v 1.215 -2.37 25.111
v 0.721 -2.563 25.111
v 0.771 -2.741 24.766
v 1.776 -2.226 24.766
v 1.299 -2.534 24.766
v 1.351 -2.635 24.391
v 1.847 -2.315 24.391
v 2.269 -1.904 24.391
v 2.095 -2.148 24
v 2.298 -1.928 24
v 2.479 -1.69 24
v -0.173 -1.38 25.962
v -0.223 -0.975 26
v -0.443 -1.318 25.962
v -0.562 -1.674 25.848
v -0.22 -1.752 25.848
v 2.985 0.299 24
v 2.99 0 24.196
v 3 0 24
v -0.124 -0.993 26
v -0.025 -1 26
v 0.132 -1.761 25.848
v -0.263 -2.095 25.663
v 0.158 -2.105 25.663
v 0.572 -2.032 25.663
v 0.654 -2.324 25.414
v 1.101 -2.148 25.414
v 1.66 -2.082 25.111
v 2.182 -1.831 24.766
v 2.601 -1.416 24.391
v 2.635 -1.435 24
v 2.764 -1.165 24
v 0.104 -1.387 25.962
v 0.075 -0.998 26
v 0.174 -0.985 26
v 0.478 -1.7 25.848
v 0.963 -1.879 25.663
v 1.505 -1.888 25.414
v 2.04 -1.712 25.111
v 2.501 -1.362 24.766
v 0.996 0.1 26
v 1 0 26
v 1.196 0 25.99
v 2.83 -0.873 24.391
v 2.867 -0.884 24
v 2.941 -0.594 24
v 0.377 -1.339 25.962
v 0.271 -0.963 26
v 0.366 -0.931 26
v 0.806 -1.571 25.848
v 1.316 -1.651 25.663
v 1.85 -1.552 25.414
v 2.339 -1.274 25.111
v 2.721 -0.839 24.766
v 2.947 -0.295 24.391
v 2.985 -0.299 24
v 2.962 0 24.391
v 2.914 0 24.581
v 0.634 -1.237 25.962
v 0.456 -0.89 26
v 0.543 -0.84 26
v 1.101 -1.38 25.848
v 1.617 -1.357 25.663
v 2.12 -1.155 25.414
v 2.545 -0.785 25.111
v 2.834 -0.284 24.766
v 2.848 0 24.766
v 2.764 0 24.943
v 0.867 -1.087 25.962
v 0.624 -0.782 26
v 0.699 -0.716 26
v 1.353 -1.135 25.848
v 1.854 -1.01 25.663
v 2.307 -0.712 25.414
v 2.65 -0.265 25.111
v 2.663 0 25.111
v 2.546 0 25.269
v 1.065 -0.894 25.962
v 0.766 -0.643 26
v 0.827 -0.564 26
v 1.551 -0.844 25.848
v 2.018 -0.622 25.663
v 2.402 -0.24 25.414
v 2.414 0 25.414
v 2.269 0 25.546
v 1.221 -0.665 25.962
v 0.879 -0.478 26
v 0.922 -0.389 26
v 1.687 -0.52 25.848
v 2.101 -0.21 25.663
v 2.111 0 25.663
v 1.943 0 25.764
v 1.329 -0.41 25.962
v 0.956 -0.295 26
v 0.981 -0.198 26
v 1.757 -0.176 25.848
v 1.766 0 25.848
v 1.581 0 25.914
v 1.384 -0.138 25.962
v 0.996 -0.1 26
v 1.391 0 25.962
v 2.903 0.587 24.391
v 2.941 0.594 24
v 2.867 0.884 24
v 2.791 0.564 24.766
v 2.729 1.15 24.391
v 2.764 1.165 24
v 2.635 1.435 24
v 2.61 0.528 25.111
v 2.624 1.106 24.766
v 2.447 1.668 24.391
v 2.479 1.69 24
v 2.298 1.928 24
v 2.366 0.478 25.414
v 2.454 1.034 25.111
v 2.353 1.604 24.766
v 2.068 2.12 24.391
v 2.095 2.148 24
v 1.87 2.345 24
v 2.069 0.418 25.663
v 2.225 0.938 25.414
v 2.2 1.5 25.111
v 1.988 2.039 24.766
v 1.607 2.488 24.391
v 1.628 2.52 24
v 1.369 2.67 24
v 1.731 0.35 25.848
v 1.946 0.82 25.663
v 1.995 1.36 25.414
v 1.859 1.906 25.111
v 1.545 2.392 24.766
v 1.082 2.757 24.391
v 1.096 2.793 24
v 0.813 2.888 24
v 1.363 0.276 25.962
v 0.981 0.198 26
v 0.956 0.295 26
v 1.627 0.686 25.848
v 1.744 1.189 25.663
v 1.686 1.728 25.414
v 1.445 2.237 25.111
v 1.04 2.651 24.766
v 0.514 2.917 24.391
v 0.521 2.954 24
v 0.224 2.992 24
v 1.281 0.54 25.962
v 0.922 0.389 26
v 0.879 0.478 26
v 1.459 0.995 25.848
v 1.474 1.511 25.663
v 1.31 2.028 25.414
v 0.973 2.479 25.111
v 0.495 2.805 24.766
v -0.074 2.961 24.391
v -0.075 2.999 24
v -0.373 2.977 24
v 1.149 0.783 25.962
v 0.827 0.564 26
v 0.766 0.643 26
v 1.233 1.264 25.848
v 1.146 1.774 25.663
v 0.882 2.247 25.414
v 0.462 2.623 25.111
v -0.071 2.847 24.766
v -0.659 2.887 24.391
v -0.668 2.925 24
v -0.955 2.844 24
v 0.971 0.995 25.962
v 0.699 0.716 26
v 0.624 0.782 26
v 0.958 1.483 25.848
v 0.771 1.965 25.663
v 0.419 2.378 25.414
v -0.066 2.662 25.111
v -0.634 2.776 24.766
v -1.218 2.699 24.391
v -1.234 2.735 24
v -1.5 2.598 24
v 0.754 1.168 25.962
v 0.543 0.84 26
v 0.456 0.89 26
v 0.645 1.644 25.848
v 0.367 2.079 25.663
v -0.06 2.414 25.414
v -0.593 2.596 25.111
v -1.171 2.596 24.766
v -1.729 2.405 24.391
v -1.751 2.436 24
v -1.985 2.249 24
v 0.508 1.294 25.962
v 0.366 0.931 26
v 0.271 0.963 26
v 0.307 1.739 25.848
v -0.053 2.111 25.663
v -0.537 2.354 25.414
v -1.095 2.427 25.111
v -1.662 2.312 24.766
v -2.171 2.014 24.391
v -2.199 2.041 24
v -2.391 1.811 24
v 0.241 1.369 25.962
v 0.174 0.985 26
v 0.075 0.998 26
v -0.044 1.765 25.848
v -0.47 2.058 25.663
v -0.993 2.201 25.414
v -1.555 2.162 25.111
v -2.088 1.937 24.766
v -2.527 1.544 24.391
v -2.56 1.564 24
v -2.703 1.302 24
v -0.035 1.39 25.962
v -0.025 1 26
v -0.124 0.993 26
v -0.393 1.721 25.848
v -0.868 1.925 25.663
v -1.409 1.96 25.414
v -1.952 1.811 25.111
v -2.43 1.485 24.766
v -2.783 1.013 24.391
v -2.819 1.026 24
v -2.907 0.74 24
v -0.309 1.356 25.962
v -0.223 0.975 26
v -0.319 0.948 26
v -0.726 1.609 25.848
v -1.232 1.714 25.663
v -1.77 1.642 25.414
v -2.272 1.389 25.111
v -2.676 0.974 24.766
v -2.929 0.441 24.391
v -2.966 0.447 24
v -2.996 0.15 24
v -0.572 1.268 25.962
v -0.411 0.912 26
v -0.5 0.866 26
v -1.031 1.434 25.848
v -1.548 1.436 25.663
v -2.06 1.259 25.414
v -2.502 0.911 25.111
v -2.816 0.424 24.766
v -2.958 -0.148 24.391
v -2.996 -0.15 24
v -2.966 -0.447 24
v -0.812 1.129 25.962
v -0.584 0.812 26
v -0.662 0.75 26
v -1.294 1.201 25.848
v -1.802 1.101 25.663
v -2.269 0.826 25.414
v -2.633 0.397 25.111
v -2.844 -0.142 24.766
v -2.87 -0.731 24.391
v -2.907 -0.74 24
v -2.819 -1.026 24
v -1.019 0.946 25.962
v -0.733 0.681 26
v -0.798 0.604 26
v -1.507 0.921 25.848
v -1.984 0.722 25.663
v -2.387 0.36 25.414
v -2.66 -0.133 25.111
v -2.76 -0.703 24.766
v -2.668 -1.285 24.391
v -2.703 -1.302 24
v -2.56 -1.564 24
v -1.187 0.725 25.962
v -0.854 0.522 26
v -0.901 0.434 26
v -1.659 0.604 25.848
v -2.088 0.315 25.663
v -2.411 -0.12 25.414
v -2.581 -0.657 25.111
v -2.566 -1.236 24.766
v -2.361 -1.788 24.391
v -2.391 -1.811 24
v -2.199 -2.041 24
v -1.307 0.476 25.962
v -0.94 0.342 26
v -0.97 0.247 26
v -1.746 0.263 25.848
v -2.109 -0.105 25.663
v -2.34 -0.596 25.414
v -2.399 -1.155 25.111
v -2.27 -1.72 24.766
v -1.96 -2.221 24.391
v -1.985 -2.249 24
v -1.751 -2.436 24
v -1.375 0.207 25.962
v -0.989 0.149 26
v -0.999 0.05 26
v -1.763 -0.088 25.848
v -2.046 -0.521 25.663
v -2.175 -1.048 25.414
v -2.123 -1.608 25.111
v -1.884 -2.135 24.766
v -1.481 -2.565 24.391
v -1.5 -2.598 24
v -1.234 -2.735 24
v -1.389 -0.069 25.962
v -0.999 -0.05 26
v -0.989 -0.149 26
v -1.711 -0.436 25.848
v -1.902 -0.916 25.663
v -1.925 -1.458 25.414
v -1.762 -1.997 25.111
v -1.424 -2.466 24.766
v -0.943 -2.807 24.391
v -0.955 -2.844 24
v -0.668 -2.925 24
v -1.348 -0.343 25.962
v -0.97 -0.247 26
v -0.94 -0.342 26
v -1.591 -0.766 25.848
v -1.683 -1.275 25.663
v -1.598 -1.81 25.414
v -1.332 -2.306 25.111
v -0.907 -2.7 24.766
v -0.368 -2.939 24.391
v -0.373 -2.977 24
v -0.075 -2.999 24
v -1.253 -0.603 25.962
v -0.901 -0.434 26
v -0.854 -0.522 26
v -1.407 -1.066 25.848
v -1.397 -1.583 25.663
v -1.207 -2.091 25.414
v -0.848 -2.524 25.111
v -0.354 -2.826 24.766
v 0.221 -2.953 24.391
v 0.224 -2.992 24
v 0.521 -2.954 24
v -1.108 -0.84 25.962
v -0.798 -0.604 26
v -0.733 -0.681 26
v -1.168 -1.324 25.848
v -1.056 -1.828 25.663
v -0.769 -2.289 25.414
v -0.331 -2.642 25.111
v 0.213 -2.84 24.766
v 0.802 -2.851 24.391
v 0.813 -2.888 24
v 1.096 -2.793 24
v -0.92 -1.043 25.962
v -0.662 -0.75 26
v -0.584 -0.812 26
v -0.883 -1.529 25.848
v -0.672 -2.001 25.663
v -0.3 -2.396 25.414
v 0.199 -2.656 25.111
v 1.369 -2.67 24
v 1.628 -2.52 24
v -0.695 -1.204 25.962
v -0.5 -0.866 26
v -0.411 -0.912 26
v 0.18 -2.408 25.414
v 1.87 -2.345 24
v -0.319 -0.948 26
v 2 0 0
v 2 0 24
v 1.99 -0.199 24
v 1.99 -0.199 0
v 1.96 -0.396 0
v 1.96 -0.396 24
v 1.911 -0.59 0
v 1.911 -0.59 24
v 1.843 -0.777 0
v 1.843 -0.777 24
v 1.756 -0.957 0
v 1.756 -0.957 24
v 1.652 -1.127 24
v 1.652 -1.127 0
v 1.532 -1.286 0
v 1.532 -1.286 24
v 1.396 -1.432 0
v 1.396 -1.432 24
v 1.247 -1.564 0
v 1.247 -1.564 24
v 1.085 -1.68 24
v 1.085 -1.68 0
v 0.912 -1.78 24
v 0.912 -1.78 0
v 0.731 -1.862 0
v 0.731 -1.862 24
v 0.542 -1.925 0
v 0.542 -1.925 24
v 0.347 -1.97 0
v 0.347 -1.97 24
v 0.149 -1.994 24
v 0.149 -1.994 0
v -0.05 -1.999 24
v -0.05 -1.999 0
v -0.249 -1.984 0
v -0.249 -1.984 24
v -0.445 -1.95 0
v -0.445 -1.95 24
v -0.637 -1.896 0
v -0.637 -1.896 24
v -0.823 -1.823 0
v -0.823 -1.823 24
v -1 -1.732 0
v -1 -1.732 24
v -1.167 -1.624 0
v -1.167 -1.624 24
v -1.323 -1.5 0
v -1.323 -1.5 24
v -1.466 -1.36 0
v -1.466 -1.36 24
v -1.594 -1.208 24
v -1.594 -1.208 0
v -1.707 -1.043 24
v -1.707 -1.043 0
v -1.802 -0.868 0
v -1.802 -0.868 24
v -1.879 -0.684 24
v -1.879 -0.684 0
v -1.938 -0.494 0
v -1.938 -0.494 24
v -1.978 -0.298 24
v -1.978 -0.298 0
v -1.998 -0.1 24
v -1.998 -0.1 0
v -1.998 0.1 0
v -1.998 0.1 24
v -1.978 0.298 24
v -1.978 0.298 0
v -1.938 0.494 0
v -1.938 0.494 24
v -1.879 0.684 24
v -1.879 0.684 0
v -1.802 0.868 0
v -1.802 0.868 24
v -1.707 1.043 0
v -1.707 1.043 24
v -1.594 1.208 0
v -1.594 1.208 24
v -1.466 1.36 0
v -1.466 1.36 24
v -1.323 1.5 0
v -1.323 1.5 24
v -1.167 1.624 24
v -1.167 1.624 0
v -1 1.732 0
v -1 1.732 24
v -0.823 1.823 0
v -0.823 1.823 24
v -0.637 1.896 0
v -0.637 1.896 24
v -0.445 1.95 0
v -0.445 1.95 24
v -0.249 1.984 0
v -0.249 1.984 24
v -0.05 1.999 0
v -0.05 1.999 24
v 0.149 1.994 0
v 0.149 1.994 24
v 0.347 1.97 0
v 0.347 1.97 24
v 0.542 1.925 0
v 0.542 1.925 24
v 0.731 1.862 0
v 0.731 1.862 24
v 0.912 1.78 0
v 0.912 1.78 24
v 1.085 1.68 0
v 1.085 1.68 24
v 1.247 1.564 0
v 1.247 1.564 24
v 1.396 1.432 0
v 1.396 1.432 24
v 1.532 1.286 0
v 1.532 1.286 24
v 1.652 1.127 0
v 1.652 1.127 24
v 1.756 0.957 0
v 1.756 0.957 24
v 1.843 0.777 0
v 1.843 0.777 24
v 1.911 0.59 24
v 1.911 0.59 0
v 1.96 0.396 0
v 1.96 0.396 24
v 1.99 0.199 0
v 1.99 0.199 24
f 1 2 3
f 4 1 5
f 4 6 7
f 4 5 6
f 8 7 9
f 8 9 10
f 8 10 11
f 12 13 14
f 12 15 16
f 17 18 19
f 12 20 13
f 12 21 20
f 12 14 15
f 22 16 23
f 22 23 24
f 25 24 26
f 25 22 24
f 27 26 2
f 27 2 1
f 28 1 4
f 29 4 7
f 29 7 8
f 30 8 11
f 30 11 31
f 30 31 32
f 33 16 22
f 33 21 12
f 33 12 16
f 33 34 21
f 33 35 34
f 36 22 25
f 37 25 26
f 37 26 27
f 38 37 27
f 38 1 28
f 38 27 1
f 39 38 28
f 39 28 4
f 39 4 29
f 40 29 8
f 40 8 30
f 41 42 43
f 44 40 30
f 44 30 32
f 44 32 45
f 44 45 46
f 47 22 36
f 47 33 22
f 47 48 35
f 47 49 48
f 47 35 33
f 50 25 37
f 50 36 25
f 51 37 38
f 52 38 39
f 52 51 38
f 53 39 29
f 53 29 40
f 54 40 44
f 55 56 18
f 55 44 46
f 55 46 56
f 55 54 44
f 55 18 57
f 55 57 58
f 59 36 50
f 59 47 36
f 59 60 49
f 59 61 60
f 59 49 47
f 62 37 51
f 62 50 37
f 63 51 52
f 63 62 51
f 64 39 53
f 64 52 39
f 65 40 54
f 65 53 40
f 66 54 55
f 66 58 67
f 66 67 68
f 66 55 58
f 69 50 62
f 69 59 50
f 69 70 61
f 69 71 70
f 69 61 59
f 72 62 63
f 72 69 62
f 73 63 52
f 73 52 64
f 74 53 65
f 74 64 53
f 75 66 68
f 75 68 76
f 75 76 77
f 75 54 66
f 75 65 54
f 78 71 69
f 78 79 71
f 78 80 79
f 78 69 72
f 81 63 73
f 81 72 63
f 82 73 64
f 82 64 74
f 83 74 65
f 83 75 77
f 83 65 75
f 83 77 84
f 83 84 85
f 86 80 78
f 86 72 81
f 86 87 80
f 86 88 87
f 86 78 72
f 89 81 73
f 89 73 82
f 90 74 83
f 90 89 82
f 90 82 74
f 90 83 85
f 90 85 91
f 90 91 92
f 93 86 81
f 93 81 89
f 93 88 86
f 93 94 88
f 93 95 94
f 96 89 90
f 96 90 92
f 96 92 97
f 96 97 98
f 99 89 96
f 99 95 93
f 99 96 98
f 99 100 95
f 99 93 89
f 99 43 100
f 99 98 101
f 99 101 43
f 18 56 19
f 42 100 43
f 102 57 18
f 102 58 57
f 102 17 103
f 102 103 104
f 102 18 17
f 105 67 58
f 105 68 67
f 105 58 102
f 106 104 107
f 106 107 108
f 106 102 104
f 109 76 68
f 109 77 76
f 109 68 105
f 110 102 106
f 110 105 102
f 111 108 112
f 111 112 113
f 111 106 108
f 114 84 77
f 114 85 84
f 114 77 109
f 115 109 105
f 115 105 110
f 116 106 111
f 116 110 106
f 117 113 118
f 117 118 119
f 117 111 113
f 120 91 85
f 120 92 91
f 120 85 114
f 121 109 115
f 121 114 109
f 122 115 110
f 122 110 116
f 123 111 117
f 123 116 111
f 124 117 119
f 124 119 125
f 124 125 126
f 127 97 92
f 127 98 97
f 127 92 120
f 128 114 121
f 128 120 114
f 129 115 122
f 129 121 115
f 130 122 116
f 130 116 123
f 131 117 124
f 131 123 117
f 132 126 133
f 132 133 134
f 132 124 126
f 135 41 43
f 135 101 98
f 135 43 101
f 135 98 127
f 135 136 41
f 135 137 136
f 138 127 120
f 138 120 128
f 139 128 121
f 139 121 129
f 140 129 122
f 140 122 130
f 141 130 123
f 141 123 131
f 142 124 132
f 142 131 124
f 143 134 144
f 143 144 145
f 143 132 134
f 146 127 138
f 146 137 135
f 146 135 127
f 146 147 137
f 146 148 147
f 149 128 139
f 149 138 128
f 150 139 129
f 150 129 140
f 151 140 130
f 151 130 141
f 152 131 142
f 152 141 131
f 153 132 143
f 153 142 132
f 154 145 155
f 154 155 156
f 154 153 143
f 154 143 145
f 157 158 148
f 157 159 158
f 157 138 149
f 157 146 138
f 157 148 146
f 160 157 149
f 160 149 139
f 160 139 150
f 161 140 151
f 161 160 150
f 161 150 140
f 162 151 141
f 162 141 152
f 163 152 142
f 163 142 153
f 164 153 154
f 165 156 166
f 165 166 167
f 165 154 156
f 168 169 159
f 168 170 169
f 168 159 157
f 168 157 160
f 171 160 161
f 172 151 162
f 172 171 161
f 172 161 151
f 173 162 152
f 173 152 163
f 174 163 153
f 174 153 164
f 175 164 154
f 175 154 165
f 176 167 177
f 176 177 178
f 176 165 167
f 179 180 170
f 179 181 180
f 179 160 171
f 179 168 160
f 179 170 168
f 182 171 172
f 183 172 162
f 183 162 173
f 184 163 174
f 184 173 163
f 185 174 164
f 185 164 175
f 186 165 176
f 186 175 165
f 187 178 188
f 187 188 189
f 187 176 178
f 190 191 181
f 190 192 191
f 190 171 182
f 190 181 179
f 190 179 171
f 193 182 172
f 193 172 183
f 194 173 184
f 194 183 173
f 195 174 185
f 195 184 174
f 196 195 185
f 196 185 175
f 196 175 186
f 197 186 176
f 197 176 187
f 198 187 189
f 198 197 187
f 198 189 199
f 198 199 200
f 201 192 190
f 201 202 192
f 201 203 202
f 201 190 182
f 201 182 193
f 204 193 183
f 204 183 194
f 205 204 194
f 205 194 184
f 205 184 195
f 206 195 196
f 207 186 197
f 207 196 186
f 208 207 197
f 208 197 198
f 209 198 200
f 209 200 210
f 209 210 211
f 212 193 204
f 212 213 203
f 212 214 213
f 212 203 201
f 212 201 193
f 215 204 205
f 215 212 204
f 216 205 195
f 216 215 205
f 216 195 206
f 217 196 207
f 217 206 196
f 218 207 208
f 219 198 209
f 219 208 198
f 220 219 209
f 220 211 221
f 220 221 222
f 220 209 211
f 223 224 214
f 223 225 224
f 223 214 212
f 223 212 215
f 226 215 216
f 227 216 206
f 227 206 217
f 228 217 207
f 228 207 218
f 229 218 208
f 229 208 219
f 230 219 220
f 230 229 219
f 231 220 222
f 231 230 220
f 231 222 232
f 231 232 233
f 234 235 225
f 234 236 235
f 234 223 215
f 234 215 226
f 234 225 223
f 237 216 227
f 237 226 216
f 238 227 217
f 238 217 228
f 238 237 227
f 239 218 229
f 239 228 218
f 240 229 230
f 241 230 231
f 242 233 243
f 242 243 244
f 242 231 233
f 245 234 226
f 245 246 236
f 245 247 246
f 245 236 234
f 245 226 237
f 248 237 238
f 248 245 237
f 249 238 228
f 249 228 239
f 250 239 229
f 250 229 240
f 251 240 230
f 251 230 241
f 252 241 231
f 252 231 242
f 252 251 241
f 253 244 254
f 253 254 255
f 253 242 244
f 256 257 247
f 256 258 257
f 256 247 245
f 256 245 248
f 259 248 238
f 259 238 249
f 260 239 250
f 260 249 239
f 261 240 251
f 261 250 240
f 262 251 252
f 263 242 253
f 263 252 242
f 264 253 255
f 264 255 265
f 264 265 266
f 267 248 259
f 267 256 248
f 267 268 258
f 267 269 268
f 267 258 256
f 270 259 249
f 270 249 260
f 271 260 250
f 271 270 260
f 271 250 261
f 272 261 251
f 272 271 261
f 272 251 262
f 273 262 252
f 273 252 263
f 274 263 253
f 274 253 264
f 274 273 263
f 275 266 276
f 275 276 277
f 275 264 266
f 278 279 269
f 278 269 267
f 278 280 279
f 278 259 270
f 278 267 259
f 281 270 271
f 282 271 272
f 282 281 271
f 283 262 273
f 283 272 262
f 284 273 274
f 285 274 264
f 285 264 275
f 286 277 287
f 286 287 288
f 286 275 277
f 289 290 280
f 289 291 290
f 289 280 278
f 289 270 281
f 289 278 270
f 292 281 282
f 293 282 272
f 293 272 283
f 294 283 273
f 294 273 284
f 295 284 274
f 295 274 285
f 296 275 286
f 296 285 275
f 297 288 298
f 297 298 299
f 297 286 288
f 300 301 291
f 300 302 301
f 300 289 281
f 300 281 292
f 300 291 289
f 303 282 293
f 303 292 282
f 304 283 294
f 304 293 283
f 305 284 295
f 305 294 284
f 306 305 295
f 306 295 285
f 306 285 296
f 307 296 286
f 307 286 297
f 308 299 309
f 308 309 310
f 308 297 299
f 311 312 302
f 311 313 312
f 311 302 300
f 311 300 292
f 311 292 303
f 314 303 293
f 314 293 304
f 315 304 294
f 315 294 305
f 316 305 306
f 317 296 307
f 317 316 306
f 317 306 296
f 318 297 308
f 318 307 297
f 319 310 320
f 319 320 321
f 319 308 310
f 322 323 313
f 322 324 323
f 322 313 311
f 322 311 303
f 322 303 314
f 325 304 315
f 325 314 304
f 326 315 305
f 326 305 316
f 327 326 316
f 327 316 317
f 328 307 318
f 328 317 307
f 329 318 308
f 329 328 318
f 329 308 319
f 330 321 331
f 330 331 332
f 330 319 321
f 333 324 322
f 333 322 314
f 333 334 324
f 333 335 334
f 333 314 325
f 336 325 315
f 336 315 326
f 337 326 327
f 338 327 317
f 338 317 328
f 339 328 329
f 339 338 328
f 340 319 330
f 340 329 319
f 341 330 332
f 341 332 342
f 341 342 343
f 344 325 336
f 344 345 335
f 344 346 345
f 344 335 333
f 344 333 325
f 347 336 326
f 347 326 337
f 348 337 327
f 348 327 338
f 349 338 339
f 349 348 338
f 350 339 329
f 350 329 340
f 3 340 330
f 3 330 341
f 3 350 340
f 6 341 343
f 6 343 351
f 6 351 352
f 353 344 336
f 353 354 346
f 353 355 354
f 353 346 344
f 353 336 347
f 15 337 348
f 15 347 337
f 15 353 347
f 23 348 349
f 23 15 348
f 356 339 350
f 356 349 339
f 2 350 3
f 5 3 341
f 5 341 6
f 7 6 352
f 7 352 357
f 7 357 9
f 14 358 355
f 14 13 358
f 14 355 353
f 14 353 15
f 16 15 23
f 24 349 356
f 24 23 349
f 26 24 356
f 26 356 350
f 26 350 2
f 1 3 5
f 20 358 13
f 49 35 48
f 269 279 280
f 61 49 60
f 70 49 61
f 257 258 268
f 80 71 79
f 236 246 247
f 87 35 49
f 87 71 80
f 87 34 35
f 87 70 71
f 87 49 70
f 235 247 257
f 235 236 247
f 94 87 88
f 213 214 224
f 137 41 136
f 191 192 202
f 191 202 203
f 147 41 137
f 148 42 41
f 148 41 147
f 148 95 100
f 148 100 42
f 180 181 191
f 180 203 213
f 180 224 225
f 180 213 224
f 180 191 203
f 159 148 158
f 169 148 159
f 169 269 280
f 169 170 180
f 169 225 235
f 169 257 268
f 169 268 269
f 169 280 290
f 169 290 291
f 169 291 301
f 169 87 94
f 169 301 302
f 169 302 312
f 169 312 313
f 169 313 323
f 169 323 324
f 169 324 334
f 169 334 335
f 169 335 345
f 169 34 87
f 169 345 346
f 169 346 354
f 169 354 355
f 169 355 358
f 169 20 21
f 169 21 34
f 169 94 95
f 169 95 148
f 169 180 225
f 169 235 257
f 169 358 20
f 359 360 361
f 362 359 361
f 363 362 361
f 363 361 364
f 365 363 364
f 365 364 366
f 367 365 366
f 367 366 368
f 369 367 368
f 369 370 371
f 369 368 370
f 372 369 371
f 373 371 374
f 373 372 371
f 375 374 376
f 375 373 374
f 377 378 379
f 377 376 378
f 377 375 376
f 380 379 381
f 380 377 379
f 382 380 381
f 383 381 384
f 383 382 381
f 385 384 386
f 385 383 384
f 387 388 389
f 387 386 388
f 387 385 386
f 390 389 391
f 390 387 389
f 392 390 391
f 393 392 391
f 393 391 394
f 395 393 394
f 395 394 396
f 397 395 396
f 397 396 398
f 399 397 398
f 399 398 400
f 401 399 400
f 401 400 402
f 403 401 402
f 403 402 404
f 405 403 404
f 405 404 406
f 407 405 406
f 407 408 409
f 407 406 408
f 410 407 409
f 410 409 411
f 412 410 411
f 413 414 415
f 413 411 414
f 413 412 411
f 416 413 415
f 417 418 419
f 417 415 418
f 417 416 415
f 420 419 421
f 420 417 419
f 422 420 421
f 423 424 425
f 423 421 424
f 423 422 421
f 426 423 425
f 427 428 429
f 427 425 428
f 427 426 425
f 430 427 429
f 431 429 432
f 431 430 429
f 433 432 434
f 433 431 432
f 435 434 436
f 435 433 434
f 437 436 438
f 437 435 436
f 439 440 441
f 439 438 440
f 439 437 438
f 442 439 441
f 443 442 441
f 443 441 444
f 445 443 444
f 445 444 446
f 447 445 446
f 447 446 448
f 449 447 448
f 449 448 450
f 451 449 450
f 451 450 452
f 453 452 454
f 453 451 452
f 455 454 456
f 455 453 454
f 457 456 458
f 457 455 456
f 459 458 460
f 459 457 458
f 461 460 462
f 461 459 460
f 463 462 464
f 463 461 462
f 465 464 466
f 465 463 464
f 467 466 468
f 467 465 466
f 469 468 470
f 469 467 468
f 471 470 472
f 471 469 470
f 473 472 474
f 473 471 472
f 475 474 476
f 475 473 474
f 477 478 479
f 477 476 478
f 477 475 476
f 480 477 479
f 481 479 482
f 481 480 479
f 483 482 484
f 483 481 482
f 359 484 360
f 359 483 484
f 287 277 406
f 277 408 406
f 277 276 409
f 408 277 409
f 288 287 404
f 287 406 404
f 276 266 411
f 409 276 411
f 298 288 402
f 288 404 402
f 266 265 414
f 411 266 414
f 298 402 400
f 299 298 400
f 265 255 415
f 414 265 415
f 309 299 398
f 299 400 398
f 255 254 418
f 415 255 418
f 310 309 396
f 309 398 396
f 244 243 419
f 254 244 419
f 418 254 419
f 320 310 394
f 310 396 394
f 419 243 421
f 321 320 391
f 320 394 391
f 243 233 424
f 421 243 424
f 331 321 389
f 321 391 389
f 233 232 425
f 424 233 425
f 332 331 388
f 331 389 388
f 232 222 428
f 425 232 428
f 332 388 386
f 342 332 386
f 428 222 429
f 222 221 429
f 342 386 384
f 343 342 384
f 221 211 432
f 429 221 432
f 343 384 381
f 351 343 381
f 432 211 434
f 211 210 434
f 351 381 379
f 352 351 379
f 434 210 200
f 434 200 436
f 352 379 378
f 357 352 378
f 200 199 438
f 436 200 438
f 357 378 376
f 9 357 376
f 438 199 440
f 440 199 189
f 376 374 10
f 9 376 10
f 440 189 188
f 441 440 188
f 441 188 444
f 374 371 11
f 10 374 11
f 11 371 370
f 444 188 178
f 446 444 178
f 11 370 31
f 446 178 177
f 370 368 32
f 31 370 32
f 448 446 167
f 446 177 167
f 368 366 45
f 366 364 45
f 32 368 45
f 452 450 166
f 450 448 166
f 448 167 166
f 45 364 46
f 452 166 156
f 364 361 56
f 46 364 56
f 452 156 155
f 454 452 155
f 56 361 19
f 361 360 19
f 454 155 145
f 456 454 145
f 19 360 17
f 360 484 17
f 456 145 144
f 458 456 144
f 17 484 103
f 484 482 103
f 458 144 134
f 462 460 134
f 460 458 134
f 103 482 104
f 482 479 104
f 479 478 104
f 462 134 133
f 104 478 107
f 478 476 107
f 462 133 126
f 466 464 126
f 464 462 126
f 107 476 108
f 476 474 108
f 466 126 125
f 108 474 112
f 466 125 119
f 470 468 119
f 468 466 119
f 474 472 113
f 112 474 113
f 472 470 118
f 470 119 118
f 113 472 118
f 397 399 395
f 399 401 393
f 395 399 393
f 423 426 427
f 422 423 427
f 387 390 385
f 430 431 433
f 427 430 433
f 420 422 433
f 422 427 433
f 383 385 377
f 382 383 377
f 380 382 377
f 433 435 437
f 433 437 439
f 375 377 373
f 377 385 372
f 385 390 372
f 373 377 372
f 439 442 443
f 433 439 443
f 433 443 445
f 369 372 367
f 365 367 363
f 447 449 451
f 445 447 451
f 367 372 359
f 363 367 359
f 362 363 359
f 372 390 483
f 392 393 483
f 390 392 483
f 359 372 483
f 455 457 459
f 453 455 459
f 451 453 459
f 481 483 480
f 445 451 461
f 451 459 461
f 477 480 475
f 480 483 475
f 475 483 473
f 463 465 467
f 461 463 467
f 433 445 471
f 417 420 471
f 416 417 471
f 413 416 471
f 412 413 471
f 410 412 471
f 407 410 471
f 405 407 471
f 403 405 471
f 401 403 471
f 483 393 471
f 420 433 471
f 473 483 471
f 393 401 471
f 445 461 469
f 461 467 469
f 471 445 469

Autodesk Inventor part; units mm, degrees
ref_plane "YZ Plane" through (0, 0, 0) normal (1, 0, 0) x (0, 1, 0)
ref_plane "XZ Plane" through (0, 0, 0) normal (0, 1, 0) x (-1, 0, 0)
ref_plane "XY Plane" through (0, 0, 0) normal (0, 0, 1) x (1, 0, 0)
sketch "スケッチ1" plane through (0, 0, 0) normal (0, 0, 1) x (1, 0, 0)
  circle A0 centre (0, 0) radius 2
  dimension "d0" = 4
extrude "押し出し1" add sketch "スケッチ1" along normal blind 24
sketch "スケッチ2" plane through (0, 0, 24) normal (0, 0, 1) x (1, 0, 0)
  circle A0 centre (0, 0) radius 2 projected
  circle A1 centre (0, 0) radius 3
  dimension "d3" = 6
extrude "押し出し2" add sketch "スケッチ2" along normal blind 2 contours A0 | A1
fillet "フィレット1" radius 2 1 edges at (-3, 0, 26)
properties part number "M4ボタンボルト24" material "鋼、高強度、低合金"
